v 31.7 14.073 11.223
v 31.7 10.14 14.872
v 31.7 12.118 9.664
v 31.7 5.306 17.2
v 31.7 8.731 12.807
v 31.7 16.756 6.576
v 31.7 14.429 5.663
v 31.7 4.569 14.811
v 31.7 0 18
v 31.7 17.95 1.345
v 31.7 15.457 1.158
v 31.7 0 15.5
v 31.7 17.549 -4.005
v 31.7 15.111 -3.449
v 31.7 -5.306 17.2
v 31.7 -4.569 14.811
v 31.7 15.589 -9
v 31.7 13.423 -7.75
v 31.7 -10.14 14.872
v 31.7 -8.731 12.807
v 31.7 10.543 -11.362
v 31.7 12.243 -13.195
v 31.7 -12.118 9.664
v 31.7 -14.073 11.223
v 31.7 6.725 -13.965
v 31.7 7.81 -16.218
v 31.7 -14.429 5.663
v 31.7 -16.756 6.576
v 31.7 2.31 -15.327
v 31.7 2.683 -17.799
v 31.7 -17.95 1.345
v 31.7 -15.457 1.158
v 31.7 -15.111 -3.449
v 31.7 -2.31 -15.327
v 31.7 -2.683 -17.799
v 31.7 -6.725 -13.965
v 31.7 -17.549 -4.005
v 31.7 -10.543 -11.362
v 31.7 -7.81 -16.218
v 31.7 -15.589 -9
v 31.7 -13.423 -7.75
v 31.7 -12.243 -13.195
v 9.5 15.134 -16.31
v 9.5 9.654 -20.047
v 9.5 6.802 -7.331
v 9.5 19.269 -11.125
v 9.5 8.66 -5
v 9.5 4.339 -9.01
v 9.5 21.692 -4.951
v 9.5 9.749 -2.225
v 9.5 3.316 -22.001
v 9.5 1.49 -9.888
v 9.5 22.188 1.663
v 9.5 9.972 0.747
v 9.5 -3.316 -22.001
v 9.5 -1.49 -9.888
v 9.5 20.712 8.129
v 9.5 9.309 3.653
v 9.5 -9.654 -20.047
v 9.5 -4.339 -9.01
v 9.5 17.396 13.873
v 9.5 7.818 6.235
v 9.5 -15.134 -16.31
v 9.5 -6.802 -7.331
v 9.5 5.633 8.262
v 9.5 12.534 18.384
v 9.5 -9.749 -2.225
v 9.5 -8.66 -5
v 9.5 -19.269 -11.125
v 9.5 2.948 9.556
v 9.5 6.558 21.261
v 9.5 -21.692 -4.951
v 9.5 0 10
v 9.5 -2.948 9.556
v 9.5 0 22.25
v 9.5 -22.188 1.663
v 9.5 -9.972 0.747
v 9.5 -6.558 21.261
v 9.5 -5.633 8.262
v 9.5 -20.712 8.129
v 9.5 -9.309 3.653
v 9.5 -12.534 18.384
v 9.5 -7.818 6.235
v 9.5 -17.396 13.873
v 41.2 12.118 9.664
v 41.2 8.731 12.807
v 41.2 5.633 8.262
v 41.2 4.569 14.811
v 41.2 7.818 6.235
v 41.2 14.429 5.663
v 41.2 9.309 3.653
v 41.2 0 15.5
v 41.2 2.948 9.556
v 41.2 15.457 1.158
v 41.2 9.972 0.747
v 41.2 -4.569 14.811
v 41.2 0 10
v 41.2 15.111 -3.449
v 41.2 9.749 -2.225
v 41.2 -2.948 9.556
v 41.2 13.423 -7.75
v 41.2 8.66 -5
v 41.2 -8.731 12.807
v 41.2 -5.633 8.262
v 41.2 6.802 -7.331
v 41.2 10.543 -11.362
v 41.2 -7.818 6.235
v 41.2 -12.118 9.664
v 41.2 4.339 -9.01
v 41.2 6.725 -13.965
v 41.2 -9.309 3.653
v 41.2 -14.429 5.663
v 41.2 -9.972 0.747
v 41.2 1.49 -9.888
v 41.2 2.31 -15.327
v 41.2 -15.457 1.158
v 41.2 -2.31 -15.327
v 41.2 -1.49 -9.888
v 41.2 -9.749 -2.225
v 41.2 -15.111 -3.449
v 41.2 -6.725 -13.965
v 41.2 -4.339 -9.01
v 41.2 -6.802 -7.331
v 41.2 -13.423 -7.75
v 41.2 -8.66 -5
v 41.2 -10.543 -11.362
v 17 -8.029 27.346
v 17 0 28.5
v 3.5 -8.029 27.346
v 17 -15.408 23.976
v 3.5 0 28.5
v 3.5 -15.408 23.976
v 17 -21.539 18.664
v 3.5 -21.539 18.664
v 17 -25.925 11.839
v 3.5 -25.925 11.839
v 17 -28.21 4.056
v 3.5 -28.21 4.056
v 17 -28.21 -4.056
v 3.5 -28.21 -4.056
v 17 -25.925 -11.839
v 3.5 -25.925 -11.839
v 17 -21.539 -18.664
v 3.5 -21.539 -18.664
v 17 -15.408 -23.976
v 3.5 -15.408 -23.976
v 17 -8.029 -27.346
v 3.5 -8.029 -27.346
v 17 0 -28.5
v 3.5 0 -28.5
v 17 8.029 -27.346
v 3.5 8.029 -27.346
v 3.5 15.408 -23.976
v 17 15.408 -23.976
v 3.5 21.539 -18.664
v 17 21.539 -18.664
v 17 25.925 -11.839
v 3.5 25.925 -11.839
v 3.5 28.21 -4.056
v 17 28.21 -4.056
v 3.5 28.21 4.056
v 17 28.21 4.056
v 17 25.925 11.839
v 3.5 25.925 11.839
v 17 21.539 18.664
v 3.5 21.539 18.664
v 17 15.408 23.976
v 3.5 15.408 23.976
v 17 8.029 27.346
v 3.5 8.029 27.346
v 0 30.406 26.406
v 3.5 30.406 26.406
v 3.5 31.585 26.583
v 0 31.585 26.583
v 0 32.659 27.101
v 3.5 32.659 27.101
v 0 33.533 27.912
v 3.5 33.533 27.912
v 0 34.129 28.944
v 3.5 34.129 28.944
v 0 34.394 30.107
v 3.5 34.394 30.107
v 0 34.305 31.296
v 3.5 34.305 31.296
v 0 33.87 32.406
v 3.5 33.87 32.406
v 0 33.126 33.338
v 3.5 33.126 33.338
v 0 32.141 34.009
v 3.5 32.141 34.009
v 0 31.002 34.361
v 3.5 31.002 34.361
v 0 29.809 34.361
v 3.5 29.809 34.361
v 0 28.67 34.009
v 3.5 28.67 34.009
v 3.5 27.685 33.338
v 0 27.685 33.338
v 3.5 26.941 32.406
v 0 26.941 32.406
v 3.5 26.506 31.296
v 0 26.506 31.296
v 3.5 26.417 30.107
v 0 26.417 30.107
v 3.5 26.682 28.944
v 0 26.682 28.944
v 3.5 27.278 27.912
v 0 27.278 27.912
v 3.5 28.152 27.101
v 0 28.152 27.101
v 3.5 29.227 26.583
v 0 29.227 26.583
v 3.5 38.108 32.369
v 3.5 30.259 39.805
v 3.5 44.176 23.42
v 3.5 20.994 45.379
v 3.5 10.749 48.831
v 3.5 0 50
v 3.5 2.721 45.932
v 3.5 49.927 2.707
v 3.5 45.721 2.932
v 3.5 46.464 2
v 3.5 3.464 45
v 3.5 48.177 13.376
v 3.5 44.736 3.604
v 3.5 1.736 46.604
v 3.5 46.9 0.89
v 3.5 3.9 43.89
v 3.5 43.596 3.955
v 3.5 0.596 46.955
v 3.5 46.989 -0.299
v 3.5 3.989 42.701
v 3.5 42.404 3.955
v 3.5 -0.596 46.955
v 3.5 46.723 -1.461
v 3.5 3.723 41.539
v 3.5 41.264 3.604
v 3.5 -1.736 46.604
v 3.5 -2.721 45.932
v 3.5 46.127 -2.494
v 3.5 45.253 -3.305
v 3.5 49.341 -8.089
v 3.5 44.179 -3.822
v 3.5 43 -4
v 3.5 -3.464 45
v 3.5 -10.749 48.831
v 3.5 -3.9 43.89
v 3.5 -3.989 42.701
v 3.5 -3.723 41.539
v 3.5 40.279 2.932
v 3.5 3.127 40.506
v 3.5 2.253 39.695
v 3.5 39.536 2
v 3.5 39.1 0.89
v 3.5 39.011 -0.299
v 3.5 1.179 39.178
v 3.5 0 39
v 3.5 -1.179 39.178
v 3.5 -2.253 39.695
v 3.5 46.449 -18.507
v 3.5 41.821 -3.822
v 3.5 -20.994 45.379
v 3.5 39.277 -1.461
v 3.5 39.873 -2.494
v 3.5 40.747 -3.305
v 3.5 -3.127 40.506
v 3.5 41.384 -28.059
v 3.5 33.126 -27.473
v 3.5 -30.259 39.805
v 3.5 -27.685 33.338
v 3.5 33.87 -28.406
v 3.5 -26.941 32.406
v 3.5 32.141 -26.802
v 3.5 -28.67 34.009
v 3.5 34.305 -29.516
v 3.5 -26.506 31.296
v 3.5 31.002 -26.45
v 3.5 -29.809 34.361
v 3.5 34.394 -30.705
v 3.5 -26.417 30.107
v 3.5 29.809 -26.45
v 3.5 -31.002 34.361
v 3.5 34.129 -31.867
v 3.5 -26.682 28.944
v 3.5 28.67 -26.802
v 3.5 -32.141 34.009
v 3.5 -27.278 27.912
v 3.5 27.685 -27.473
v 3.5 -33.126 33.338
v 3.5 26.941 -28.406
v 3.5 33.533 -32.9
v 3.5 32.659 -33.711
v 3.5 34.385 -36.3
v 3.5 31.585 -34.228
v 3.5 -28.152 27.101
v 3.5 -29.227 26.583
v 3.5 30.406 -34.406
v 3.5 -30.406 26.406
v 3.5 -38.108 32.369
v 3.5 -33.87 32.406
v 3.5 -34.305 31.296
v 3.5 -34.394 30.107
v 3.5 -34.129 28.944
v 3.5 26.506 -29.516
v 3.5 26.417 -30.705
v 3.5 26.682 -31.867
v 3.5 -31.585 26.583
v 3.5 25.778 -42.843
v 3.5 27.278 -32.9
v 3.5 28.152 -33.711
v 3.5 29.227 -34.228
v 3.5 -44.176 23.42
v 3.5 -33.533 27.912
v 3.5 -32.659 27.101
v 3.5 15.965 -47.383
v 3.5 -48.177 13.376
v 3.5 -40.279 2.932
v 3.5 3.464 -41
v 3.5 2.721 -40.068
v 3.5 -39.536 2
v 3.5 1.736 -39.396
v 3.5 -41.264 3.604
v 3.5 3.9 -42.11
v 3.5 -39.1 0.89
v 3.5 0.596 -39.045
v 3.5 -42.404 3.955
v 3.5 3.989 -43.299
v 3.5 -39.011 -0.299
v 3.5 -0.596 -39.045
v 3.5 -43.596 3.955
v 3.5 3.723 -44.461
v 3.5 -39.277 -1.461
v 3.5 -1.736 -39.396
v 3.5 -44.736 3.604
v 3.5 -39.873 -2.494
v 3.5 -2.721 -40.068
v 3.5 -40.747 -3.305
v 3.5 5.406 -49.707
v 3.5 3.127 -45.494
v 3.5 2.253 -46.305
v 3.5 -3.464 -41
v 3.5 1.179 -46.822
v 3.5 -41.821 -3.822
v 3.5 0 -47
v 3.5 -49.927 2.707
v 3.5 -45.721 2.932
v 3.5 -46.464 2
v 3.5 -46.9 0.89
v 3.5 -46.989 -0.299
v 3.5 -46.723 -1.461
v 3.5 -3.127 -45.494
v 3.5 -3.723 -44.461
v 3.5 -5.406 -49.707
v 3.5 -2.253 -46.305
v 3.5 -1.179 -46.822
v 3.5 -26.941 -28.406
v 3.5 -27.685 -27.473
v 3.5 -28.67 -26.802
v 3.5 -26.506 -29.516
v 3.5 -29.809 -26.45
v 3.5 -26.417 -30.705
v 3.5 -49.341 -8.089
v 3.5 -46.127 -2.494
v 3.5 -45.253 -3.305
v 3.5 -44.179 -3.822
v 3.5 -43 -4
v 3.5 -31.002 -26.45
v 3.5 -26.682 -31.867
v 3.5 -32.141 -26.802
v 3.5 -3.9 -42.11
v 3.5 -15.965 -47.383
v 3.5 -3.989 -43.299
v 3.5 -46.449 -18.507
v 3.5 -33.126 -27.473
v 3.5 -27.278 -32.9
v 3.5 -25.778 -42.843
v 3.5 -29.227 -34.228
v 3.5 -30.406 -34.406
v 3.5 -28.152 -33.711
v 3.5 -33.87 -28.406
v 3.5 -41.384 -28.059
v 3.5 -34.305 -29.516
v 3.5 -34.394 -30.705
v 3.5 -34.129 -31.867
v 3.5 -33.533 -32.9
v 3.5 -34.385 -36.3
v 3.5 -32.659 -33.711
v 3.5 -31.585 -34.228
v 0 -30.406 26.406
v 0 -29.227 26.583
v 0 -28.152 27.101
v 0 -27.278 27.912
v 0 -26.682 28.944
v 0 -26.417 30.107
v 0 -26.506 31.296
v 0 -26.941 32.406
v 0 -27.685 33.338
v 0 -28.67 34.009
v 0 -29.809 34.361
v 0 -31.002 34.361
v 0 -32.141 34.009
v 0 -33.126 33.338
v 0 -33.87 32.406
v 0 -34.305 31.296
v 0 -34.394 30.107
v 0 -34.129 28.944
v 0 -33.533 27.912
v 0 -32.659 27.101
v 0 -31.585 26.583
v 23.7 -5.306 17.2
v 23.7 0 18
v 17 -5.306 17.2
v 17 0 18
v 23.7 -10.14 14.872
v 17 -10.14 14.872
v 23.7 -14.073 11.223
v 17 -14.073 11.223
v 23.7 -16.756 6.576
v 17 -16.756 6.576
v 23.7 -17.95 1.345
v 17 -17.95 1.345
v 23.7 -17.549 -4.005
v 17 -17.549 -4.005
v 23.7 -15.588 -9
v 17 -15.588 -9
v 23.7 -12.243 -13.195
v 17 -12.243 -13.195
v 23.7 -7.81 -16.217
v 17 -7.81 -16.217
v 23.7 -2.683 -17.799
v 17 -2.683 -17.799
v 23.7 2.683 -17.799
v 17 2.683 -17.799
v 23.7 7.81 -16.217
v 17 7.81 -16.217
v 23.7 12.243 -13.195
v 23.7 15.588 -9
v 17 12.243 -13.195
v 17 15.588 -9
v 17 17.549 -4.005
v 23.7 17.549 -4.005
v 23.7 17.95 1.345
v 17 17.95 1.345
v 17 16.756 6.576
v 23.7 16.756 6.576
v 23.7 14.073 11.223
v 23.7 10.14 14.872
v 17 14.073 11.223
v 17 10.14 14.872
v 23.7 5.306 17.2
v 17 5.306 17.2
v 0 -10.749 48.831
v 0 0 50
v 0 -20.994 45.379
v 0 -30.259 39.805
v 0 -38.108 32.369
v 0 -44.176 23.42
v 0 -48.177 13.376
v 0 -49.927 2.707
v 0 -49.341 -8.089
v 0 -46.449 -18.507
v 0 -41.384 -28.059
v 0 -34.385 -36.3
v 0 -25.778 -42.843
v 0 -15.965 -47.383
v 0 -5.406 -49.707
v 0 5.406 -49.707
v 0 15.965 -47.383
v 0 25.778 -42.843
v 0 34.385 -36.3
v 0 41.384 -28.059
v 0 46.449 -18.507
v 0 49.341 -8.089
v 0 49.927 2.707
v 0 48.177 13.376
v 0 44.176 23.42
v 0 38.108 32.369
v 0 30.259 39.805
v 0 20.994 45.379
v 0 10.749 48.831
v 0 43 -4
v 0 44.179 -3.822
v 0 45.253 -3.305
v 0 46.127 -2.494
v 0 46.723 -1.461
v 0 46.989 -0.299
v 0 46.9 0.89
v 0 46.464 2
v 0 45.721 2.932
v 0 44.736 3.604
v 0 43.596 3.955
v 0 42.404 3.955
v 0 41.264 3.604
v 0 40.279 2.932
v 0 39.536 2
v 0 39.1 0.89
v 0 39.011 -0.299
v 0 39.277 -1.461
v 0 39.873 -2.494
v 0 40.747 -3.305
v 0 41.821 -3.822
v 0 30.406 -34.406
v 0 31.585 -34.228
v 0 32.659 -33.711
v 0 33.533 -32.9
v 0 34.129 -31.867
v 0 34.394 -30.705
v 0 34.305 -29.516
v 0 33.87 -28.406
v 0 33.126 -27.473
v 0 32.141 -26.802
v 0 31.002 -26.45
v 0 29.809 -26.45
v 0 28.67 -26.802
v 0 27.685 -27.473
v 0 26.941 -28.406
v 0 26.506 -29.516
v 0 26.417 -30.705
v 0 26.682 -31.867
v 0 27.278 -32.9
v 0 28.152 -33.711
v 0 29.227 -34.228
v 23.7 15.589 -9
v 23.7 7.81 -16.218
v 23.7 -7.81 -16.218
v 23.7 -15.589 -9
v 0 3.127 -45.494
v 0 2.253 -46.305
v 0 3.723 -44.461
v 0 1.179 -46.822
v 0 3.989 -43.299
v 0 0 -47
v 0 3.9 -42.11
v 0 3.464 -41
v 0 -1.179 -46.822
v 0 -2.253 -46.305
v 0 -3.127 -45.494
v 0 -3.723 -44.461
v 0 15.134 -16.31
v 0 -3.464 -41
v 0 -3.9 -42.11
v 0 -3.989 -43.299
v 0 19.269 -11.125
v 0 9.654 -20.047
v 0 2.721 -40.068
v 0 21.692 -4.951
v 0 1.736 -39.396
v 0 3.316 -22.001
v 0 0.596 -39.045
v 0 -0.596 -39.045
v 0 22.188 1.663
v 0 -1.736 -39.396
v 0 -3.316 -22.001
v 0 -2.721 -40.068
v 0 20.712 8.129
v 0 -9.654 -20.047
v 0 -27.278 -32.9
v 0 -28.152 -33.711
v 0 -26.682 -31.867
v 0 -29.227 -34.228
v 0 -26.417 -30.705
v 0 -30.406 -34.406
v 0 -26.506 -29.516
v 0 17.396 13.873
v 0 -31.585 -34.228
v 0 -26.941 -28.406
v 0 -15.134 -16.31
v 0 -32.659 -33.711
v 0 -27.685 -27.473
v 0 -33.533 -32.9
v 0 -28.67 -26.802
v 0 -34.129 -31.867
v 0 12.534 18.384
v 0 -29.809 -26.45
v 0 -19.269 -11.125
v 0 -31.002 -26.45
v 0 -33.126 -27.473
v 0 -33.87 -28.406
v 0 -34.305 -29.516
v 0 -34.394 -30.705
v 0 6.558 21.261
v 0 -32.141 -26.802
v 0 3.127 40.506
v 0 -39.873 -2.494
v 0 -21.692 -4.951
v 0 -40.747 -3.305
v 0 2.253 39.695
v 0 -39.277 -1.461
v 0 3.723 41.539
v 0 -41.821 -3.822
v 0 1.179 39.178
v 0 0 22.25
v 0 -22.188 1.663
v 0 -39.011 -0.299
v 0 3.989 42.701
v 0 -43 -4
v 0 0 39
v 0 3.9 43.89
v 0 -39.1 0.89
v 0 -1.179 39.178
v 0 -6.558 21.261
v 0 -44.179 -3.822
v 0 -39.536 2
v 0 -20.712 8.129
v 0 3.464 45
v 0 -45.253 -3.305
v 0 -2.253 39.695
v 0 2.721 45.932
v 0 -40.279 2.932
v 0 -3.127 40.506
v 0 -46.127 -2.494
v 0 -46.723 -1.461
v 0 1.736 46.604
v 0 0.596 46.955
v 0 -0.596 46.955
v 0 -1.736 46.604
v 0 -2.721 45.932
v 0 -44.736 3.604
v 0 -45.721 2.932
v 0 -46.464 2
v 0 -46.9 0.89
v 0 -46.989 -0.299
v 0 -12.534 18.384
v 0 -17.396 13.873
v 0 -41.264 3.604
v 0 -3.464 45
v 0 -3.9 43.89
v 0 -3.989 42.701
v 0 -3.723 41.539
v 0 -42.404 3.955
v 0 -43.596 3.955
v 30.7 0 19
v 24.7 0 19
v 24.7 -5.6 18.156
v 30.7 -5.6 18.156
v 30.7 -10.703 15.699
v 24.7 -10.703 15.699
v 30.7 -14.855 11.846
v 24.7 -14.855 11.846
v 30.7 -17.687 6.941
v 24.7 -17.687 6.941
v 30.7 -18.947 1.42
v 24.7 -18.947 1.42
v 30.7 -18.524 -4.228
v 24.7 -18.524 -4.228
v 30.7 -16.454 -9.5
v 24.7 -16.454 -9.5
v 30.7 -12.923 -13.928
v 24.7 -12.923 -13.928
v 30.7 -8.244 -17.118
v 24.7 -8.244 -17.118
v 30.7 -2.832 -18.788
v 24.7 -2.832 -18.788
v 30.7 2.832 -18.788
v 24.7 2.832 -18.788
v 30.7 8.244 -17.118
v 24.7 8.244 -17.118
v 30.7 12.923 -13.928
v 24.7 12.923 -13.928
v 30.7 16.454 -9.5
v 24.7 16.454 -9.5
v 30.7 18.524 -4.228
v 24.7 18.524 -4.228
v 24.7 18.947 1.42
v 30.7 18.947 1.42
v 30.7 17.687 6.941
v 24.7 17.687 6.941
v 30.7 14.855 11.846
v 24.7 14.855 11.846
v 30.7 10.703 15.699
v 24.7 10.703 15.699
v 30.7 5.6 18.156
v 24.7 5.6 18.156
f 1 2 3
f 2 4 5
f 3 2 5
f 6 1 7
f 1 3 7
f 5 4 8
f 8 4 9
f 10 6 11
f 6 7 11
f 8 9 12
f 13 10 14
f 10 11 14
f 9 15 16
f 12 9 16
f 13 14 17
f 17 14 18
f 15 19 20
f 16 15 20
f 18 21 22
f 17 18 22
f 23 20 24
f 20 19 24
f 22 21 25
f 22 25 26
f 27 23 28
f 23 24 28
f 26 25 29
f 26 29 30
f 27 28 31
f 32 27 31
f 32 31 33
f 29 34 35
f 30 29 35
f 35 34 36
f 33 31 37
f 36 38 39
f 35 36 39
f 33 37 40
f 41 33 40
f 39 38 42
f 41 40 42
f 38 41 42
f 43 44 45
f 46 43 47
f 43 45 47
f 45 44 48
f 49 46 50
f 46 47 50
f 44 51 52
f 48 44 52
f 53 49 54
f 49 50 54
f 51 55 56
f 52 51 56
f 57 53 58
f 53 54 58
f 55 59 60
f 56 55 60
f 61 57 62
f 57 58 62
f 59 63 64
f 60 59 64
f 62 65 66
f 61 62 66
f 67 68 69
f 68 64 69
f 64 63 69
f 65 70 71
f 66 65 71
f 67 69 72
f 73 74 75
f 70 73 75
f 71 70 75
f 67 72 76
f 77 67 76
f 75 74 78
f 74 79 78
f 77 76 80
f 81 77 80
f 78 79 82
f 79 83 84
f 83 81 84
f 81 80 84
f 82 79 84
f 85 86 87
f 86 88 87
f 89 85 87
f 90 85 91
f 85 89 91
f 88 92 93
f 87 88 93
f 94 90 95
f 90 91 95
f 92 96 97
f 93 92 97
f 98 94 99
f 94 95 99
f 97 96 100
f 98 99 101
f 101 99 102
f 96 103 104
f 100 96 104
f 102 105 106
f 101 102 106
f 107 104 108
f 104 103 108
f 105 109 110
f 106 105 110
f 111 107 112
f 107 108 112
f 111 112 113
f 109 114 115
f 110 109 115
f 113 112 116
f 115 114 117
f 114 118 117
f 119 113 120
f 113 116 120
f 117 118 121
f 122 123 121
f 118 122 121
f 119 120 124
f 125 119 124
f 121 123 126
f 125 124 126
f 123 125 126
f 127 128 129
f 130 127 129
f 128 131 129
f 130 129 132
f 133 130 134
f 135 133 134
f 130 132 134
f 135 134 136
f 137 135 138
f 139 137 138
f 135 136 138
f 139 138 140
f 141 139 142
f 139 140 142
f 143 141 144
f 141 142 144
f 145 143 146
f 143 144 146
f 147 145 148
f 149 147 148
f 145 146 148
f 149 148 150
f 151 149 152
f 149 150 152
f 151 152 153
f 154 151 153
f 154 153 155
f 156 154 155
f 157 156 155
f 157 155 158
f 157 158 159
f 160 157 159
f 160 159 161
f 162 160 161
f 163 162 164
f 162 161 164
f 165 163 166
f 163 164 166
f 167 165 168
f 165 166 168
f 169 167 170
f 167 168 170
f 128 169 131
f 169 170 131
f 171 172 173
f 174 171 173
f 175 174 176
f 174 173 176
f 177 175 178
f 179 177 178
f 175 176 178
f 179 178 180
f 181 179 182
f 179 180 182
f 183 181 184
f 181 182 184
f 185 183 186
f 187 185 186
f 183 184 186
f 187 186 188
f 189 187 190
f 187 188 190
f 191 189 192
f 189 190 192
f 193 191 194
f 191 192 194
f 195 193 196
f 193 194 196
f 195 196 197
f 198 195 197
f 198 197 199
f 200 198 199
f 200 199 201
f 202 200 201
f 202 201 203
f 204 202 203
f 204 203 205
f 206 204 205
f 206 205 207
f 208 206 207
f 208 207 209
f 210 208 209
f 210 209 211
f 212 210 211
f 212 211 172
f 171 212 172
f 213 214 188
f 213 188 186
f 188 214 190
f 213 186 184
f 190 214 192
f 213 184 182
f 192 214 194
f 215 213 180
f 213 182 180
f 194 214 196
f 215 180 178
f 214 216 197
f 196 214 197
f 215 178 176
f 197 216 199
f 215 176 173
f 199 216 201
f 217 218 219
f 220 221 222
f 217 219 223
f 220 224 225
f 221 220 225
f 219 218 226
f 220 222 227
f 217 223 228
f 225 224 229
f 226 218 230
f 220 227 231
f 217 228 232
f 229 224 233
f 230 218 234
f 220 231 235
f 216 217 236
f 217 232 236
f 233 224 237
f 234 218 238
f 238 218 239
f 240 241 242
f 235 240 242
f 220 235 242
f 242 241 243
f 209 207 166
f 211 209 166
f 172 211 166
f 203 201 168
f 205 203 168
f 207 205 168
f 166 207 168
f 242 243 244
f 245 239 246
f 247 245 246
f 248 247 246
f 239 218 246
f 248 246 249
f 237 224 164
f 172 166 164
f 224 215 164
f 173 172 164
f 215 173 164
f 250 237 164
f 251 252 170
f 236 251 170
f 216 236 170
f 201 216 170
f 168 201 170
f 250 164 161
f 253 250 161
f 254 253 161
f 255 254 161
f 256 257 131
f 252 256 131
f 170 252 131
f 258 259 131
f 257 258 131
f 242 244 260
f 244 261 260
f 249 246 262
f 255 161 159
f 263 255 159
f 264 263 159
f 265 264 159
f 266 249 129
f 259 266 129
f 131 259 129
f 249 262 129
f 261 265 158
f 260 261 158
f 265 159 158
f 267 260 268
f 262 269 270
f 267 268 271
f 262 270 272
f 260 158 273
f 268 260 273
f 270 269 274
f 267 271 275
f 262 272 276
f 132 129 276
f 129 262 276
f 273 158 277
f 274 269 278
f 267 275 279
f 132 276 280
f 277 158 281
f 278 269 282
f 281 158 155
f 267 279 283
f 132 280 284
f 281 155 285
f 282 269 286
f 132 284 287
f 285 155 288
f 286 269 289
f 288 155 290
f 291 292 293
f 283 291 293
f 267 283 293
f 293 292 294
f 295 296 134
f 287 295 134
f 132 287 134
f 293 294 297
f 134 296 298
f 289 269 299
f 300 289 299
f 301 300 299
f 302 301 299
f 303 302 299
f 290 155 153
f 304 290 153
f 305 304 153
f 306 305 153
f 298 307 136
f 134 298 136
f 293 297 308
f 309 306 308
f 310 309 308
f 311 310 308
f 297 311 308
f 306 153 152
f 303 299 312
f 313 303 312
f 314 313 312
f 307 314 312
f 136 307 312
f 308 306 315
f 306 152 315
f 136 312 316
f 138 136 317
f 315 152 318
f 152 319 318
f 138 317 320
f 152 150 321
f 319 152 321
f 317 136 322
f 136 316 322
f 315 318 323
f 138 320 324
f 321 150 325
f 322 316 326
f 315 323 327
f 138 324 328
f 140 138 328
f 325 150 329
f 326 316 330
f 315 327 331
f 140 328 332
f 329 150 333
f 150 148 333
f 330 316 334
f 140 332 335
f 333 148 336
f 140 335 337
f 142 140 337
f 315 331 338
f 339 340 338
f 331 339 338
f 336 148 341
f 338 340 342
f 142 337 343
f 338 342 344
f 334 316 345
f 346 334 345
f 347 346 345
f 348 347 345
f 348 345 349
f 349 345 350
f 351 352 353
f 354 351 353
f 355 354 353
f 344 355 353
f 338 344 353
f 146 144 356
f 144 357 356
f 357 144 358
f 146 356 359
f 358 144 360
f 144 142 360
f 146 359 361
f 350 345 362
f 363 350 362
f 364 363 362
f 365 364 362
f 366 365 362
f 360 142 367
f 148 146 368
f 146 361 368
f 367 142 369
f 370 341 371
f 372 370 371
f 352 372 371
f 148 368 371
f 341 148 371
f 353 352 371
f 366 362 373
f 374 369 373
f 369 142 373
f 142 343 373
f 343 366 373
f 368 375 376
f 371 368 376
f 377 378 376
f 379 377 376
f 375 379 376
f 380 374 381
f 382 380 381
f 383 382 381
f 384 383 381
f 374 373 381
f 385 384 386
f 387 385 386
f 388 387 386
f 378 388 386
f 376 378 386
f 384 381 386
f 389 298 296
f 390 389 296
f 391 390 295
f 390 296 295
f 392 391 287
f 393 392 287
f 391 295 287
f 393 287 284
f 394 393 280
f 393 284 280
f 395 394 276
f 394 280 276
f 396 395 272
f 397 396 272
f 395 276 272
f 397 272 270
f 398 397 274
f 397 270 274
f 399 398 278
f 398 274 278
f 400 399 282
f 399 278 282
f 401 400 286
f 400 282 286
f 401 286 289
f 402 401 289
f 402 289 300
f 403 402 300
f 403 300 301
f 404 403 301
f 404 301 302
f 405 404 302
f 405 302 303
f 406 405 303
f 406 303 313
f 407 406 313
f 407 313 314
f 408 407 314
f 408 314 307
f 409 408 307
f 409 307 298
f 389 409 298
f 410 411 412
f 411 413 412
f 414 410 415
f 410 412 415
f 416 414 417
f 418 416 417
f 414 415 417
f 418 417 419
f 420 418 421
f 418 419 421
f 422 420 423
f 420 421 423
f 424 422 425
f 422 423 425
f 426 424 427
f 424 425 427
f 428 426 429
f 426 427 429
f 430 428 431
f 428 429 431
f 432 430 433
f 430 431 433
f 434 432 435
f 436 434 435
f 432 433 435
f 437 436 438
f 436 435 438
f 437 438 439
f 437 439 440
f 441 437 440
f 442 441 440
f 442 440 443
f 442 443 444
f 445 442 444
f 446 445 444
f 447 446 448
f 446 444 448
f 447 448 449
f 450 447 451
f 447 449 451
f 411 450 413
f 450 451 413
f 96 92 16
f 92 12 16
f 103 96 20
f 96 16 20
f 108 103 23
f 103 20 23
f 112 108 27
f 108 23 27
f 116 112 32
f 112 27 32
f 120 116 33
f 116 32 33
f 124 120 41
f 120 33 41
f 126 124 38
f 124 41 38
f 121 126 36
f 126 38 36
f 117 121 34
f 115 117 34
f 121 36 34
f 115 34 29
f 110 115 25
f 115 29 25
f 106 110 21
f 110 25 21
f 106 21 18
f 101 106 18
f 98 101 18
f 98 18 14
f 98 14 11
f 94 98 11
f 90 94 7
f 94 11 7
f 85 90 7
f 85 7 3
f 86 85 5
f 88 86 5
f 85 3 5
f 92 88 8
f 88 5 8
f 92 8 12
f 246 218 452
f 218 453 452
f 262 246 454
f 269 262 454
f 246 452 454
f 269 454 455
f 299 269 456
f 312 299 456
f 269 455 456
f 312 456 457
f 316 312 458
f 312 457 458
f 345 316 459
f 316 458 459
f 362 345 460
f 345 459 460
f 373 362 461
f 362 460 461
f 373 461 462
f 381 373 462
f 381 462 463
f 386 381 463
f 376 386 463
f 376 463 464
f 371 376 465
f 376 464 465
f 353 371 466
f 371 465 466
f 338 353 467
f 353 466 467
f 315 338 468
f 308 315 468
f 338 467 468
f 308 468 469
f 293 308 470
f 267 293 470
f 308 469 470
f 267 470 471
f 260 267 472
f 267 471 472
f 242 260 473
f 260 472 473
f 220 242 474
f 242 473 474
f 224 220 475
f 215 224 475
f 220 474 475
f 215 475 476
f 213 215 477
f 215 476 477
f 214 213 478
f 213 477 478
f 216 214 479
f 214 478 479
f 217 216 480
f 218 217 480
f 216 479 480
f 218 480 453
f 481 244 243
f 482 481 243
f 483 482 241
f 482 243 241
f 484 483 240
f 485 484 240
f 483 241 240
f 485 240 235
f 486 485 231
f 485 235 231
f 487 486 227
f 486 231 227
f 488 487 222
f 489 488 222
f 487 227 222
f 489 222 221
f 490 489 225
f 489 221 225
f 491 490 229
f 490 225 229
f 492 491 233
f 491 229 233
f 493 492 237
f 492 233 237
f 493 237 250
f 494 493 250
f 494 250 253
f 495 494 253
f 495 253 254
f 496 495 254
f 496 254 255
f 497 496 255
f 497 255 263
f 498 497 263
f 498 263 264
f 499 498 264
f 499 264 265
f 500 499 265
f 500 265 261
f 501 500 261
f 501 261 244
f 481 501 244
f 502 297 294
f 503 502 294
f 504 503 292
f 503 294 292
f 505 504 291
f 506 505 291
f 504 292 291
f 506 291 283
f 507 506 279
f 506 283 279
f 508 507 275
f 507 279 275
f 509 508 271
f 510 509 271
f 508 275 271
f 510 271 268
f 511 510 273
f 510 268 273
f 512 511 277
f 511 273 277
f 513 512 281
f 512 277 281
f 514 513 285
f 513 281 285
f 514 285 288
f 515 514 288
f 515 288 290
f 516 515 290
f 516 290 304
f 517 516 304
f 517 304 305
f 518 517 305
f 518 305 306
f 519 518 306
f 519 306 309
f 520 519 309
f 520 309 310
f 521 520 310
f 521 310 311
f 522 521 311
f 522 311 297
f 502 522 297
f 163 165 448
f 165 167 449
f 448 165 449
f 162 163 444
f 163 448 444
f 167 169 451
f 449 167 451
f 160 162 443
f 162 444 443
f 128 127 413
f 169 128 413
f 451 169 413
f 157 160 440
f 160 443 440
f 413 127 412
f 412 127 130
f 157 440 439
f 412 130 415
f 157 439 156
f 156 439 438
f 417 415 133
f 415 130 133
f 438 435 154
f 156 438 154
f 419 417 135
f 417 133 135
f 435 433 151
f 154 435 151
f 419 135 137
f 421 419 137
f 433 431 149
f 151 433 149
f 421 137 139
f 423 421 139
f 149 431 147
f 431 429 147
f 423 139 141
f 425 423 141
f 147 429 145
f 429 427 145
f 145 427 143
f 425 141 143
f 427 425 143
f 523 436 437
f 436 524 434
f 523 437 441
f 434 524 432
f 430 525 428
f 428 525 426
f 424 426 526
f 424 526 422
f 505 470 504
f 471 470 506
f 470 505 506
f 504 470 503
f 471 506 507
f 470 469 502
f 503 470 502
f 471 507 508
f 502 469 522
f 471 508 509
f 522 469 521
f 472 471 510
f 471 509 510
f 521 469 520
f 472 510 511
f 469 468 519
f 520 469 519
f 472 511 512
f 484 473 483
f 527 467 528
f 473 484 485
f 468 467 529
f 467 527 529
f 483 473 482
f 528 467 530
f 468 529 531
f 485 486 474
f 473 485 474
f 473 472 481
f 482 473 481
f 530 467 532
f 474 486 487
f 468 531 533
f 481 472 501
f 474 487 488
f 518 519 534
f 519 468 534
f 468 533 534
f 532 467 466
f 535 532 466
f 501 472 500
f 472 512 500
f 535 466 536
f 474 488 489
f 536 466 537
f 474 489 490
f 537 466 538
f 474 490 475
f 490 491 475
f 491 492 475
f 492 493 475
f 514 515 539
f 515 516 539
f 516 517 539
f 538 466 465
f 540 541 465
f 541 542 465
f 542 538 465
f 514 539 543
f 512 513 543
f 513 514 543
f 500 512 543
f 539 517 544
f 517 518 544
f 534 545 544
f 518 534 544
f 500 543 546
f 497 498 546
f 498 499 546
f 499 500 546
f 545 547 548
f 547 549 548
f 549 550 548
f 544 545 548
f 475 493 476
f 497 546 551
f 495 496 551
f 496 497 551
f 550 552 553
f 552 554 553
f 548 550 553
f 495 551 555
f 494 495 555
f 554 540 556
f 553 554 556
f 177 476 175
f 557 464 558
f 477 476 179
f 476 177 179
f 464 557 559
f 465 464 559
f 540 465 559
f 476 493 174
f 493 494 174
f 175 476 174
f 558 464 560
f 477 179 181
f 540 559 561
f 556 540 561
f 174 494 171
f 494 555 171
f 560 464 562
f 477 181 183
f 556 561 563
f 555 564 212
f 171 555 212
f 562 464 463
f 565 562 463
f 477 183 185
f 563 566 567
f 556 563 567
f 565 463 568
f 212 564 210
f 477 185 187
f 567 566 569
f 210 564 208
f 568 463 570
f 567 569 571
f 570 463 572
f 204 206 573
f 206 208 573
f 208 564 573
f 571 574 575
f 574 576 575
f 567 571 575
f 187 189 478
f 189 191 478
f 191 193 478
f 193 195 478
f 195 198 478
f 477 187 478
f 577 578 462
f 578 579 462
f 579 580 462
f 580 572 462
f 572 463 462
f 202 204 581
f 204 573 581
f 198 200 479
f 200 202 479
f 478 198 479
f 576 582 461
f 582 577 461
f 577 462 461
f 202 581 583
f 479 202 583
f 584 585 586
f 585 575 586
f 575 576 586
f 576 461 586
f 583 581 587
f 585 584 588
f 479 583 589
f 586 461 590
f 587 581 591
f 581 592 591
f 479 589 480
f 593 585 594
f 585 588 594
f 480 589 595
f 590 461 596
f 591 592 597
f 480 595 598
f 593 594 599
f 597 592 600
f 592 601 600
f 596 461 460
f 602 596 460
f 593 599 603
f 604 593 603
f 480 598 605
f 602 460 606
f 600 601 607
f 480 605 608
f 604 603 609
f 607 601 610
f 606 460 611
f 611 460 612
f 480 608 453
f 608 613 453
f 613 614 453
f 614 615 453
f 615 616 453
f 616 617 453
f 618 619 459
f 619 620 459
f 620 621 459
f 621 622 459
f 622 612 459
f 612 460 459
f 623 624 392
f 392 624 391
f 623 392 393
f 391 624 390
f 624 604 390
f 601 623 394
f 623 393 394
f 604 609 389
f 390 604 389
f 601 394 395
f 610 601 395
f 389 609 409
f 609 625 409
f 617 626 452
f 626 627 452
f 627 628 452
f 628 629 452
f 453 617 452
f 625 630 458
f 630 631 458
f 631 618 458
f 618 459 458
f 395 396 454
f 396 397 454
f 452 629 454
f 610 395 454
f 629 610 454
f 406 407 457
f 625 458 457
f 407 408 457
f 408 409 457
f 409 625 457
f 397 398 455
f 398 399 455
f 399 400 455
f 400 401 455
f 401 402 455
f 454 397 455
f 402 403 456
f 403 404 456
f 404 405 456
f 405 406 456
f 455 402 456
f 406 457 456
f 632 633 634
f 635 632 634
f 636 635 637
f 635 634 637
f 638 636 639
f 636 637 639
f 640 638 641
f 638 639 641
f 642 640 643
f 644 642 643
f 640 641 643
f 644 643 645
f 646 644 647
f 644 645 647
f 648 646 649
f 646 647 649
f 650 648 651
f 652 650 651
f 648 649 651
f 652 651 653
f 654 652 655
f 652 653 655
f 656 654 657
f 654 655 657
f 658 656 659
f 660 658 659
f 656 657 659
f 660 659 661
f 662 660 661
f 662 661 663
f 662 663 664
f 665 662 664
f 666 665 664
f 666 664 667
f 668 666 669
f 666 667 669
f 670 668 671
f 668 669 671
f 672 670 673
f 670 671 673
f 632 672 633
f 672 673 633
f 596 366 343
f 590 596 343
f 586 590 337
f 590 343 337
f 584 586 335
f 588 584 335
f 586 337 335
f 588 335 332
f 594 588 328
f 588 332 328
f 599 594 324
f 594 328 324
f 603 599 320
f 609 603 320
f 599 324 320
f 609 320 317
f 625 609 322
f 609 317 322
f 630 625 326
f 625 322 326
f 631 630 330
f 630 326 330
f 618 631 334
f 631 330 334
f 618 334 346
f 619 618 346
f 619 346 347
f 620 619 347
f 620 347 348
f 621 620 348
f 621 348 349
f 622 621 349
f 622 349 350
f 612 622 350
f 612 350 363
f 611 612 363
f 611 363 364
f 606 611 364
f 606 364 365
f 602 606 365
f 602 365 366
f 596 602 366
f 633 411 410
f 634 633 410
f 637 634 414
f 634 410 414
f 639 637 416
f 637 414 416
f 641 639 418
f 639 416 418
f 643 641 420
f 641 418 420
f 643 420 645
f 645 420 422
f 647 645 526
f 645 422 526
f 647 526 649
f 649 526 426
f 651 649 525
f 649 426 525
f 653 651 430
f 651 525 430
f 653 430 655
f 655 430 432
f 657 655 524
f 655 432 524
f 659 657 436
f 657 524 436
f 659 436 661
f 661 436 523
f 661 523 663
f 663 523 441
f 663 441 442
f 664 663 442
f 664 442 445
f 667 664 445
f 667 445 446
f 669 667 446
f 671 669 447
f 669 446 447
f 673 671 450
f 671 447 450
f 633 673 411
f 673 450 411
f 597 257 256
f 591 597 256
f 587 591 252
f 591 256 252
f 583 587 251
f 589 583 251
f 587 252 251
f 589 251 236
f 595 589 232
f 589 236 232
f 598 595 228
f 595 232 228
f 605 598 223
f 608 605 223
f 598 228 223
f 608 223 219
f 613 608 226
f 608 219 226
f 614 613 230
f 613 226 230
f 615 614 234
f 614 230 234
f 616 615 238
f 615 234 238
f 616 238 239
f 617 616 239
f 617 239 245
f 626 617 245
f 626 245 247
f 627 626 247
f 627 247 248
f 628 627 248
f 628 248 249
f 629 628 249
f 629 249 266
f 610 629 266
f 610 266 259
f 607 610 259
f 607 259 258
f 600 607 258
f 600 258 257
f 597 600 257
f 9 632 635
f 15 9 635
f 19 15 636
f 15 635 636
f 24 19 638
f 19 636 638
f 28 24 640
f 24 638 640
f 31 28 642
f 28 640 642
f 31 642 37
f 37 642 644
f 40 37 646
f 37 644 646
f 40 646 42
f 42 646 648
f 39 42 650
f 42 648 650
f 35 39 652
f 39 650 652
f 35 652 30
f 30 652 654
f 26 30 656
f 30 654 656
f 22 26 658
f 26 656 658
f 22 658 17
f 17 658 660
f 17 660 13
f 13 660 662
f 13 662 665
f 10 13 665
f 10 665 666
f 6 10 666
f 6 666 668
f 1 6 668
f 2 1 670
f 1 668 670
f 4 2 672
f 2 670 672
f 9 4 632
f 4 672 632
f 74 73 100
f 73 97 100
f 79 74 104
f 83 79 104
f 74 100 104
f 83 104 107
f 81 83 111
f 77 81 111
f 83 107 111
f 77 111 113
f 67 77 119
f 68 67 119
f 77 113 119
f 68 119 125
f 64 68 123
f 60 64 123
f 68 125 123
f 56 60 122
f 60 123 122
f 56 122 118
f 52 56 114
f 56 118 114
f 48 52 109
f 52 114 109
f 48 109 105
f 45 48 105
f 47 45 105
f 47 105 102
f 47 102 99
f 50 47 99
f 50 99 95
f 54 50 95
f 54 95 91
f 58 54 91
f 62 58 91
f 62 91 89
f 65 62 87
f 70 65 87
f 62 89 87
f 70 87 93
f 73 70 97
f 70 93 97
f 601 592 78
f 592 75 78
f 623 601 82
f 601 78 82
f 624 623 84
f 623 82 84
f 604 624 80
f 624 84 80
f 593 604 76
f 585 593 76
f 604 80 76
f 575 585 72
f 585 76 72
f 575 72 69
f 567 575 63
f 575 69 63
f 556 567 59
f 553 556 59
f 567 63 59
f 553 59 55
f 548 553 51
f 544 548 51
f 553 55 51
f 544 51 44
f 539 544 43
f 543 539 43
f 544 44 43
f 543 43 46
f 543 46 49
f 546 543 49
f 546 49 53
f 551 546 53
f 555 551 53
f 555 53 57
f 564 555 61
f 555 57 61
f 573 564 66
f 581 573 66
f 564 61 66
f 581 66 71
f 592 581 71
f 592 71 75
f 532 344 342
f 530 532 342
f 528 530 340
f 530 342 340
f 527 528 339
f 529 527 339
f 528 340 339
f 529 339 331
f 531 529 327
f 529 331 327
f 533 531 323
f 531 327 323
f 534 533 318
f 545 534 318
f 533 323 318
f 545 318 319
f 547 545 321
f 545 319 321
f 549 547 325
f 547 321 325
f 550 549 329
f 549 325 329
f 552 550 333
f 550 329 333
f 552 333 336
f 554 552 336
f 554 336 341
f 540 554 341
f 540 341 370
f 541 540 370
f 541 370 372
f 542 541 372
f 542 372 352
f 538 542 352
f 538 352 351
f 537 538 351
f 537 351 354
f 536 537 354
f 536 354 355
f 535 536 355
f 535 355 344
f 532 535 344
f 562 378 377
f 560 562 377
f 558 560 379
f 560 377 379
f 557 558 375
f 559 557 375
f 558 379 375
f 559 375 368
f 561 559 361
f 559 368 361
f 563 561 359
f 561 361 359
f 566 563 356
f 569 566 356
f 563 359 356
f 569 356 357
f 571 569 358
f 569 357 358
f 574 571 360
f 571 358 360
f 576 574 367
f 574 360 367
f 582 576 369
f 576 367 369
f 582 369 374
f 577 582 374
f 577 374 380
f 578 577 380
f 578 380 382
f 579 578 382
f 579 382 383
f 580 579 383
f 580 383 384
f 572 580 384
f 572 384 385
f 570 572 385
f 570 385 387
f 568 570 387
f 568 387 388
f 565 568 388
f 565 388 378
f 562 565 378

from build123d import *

# Parameters (mm, degrees)
CROQUIS2_R            = 4
CORTAR_EXTRUIR1_DEPTH = 81.132952023
CHAFL_N1_SIZE         = 1


with BuildPart() as part:
    # Croquis1 → Revolución1 (revolve)
    with BuildSketch(Plane.XY, mode=Mode.PRIVATE) as revoluci_n1_sk:
        Polygon((0, 22.25), (9.5, 22.25), (9.5, 10), (41.2, 10), (41.2, 15.5), (31.7, 15.5), (31.7, 18), (31.7, 19), (23.7, 19), (23.7, 18), (17, 18), (17, 28.5), (3.5, 28.5), (3.5, 50), (0, 50), align=None)
    revolve(revoluci_n1_sk.sketch.rotate(Axis((-60.102579917, 0, 0), (1, 0, 0)), 90), axis=Axis((-60.102579917, 0, 0), (1, 0, 0)))

    # Croquis2 → Cortar-Extruir1 (cut, through all)
    with BuildSketch(Plane(origin=(3.5, 0, 0), x_dir=(0, 0, -1), z_dir=(1, 0, 0))):
        with Locations((0, 43)):
            Circle(CROQUIS2_R)
        with Locations((30.405591591, 30.405591591)):
            Circle(CROQUIS2_R)
        with Locations((43, 0)):
            Circle(CROQUIS2_R)
        with Locations((30.405591591, -30.405591591)):
            Circle(CROQUIS2_R)
        with Locations((0, -43)):
            Circle(CROQUIS2_R)
        with Locations((-30.405591591, -30.405591591)):
            Circle(CROQUIS2_R)
        with Locations((-43, 0)):
            Circle(CROQUIS2_R)
        with Locations((-30.405591591, 30.405591591)):
            Circle(CROQUIS2_R)
    extrude(amount=-CORTAR_EXTRUIR1_DEPTH, mode=Mode.SUBTRACT)

    # Chaflán1
    chafl_n1_edges = [part.edges().sort_by_distance(p)[0] for p in [
        (23.7, 0, -19),
        (31.7, 0, -19),
    ]]
    chamfer(chafl_n1_edges, length=CHAFL_N1_SIZE - 0.0001)  # a hair under: the kernel refuses the full size


solid = part.part
